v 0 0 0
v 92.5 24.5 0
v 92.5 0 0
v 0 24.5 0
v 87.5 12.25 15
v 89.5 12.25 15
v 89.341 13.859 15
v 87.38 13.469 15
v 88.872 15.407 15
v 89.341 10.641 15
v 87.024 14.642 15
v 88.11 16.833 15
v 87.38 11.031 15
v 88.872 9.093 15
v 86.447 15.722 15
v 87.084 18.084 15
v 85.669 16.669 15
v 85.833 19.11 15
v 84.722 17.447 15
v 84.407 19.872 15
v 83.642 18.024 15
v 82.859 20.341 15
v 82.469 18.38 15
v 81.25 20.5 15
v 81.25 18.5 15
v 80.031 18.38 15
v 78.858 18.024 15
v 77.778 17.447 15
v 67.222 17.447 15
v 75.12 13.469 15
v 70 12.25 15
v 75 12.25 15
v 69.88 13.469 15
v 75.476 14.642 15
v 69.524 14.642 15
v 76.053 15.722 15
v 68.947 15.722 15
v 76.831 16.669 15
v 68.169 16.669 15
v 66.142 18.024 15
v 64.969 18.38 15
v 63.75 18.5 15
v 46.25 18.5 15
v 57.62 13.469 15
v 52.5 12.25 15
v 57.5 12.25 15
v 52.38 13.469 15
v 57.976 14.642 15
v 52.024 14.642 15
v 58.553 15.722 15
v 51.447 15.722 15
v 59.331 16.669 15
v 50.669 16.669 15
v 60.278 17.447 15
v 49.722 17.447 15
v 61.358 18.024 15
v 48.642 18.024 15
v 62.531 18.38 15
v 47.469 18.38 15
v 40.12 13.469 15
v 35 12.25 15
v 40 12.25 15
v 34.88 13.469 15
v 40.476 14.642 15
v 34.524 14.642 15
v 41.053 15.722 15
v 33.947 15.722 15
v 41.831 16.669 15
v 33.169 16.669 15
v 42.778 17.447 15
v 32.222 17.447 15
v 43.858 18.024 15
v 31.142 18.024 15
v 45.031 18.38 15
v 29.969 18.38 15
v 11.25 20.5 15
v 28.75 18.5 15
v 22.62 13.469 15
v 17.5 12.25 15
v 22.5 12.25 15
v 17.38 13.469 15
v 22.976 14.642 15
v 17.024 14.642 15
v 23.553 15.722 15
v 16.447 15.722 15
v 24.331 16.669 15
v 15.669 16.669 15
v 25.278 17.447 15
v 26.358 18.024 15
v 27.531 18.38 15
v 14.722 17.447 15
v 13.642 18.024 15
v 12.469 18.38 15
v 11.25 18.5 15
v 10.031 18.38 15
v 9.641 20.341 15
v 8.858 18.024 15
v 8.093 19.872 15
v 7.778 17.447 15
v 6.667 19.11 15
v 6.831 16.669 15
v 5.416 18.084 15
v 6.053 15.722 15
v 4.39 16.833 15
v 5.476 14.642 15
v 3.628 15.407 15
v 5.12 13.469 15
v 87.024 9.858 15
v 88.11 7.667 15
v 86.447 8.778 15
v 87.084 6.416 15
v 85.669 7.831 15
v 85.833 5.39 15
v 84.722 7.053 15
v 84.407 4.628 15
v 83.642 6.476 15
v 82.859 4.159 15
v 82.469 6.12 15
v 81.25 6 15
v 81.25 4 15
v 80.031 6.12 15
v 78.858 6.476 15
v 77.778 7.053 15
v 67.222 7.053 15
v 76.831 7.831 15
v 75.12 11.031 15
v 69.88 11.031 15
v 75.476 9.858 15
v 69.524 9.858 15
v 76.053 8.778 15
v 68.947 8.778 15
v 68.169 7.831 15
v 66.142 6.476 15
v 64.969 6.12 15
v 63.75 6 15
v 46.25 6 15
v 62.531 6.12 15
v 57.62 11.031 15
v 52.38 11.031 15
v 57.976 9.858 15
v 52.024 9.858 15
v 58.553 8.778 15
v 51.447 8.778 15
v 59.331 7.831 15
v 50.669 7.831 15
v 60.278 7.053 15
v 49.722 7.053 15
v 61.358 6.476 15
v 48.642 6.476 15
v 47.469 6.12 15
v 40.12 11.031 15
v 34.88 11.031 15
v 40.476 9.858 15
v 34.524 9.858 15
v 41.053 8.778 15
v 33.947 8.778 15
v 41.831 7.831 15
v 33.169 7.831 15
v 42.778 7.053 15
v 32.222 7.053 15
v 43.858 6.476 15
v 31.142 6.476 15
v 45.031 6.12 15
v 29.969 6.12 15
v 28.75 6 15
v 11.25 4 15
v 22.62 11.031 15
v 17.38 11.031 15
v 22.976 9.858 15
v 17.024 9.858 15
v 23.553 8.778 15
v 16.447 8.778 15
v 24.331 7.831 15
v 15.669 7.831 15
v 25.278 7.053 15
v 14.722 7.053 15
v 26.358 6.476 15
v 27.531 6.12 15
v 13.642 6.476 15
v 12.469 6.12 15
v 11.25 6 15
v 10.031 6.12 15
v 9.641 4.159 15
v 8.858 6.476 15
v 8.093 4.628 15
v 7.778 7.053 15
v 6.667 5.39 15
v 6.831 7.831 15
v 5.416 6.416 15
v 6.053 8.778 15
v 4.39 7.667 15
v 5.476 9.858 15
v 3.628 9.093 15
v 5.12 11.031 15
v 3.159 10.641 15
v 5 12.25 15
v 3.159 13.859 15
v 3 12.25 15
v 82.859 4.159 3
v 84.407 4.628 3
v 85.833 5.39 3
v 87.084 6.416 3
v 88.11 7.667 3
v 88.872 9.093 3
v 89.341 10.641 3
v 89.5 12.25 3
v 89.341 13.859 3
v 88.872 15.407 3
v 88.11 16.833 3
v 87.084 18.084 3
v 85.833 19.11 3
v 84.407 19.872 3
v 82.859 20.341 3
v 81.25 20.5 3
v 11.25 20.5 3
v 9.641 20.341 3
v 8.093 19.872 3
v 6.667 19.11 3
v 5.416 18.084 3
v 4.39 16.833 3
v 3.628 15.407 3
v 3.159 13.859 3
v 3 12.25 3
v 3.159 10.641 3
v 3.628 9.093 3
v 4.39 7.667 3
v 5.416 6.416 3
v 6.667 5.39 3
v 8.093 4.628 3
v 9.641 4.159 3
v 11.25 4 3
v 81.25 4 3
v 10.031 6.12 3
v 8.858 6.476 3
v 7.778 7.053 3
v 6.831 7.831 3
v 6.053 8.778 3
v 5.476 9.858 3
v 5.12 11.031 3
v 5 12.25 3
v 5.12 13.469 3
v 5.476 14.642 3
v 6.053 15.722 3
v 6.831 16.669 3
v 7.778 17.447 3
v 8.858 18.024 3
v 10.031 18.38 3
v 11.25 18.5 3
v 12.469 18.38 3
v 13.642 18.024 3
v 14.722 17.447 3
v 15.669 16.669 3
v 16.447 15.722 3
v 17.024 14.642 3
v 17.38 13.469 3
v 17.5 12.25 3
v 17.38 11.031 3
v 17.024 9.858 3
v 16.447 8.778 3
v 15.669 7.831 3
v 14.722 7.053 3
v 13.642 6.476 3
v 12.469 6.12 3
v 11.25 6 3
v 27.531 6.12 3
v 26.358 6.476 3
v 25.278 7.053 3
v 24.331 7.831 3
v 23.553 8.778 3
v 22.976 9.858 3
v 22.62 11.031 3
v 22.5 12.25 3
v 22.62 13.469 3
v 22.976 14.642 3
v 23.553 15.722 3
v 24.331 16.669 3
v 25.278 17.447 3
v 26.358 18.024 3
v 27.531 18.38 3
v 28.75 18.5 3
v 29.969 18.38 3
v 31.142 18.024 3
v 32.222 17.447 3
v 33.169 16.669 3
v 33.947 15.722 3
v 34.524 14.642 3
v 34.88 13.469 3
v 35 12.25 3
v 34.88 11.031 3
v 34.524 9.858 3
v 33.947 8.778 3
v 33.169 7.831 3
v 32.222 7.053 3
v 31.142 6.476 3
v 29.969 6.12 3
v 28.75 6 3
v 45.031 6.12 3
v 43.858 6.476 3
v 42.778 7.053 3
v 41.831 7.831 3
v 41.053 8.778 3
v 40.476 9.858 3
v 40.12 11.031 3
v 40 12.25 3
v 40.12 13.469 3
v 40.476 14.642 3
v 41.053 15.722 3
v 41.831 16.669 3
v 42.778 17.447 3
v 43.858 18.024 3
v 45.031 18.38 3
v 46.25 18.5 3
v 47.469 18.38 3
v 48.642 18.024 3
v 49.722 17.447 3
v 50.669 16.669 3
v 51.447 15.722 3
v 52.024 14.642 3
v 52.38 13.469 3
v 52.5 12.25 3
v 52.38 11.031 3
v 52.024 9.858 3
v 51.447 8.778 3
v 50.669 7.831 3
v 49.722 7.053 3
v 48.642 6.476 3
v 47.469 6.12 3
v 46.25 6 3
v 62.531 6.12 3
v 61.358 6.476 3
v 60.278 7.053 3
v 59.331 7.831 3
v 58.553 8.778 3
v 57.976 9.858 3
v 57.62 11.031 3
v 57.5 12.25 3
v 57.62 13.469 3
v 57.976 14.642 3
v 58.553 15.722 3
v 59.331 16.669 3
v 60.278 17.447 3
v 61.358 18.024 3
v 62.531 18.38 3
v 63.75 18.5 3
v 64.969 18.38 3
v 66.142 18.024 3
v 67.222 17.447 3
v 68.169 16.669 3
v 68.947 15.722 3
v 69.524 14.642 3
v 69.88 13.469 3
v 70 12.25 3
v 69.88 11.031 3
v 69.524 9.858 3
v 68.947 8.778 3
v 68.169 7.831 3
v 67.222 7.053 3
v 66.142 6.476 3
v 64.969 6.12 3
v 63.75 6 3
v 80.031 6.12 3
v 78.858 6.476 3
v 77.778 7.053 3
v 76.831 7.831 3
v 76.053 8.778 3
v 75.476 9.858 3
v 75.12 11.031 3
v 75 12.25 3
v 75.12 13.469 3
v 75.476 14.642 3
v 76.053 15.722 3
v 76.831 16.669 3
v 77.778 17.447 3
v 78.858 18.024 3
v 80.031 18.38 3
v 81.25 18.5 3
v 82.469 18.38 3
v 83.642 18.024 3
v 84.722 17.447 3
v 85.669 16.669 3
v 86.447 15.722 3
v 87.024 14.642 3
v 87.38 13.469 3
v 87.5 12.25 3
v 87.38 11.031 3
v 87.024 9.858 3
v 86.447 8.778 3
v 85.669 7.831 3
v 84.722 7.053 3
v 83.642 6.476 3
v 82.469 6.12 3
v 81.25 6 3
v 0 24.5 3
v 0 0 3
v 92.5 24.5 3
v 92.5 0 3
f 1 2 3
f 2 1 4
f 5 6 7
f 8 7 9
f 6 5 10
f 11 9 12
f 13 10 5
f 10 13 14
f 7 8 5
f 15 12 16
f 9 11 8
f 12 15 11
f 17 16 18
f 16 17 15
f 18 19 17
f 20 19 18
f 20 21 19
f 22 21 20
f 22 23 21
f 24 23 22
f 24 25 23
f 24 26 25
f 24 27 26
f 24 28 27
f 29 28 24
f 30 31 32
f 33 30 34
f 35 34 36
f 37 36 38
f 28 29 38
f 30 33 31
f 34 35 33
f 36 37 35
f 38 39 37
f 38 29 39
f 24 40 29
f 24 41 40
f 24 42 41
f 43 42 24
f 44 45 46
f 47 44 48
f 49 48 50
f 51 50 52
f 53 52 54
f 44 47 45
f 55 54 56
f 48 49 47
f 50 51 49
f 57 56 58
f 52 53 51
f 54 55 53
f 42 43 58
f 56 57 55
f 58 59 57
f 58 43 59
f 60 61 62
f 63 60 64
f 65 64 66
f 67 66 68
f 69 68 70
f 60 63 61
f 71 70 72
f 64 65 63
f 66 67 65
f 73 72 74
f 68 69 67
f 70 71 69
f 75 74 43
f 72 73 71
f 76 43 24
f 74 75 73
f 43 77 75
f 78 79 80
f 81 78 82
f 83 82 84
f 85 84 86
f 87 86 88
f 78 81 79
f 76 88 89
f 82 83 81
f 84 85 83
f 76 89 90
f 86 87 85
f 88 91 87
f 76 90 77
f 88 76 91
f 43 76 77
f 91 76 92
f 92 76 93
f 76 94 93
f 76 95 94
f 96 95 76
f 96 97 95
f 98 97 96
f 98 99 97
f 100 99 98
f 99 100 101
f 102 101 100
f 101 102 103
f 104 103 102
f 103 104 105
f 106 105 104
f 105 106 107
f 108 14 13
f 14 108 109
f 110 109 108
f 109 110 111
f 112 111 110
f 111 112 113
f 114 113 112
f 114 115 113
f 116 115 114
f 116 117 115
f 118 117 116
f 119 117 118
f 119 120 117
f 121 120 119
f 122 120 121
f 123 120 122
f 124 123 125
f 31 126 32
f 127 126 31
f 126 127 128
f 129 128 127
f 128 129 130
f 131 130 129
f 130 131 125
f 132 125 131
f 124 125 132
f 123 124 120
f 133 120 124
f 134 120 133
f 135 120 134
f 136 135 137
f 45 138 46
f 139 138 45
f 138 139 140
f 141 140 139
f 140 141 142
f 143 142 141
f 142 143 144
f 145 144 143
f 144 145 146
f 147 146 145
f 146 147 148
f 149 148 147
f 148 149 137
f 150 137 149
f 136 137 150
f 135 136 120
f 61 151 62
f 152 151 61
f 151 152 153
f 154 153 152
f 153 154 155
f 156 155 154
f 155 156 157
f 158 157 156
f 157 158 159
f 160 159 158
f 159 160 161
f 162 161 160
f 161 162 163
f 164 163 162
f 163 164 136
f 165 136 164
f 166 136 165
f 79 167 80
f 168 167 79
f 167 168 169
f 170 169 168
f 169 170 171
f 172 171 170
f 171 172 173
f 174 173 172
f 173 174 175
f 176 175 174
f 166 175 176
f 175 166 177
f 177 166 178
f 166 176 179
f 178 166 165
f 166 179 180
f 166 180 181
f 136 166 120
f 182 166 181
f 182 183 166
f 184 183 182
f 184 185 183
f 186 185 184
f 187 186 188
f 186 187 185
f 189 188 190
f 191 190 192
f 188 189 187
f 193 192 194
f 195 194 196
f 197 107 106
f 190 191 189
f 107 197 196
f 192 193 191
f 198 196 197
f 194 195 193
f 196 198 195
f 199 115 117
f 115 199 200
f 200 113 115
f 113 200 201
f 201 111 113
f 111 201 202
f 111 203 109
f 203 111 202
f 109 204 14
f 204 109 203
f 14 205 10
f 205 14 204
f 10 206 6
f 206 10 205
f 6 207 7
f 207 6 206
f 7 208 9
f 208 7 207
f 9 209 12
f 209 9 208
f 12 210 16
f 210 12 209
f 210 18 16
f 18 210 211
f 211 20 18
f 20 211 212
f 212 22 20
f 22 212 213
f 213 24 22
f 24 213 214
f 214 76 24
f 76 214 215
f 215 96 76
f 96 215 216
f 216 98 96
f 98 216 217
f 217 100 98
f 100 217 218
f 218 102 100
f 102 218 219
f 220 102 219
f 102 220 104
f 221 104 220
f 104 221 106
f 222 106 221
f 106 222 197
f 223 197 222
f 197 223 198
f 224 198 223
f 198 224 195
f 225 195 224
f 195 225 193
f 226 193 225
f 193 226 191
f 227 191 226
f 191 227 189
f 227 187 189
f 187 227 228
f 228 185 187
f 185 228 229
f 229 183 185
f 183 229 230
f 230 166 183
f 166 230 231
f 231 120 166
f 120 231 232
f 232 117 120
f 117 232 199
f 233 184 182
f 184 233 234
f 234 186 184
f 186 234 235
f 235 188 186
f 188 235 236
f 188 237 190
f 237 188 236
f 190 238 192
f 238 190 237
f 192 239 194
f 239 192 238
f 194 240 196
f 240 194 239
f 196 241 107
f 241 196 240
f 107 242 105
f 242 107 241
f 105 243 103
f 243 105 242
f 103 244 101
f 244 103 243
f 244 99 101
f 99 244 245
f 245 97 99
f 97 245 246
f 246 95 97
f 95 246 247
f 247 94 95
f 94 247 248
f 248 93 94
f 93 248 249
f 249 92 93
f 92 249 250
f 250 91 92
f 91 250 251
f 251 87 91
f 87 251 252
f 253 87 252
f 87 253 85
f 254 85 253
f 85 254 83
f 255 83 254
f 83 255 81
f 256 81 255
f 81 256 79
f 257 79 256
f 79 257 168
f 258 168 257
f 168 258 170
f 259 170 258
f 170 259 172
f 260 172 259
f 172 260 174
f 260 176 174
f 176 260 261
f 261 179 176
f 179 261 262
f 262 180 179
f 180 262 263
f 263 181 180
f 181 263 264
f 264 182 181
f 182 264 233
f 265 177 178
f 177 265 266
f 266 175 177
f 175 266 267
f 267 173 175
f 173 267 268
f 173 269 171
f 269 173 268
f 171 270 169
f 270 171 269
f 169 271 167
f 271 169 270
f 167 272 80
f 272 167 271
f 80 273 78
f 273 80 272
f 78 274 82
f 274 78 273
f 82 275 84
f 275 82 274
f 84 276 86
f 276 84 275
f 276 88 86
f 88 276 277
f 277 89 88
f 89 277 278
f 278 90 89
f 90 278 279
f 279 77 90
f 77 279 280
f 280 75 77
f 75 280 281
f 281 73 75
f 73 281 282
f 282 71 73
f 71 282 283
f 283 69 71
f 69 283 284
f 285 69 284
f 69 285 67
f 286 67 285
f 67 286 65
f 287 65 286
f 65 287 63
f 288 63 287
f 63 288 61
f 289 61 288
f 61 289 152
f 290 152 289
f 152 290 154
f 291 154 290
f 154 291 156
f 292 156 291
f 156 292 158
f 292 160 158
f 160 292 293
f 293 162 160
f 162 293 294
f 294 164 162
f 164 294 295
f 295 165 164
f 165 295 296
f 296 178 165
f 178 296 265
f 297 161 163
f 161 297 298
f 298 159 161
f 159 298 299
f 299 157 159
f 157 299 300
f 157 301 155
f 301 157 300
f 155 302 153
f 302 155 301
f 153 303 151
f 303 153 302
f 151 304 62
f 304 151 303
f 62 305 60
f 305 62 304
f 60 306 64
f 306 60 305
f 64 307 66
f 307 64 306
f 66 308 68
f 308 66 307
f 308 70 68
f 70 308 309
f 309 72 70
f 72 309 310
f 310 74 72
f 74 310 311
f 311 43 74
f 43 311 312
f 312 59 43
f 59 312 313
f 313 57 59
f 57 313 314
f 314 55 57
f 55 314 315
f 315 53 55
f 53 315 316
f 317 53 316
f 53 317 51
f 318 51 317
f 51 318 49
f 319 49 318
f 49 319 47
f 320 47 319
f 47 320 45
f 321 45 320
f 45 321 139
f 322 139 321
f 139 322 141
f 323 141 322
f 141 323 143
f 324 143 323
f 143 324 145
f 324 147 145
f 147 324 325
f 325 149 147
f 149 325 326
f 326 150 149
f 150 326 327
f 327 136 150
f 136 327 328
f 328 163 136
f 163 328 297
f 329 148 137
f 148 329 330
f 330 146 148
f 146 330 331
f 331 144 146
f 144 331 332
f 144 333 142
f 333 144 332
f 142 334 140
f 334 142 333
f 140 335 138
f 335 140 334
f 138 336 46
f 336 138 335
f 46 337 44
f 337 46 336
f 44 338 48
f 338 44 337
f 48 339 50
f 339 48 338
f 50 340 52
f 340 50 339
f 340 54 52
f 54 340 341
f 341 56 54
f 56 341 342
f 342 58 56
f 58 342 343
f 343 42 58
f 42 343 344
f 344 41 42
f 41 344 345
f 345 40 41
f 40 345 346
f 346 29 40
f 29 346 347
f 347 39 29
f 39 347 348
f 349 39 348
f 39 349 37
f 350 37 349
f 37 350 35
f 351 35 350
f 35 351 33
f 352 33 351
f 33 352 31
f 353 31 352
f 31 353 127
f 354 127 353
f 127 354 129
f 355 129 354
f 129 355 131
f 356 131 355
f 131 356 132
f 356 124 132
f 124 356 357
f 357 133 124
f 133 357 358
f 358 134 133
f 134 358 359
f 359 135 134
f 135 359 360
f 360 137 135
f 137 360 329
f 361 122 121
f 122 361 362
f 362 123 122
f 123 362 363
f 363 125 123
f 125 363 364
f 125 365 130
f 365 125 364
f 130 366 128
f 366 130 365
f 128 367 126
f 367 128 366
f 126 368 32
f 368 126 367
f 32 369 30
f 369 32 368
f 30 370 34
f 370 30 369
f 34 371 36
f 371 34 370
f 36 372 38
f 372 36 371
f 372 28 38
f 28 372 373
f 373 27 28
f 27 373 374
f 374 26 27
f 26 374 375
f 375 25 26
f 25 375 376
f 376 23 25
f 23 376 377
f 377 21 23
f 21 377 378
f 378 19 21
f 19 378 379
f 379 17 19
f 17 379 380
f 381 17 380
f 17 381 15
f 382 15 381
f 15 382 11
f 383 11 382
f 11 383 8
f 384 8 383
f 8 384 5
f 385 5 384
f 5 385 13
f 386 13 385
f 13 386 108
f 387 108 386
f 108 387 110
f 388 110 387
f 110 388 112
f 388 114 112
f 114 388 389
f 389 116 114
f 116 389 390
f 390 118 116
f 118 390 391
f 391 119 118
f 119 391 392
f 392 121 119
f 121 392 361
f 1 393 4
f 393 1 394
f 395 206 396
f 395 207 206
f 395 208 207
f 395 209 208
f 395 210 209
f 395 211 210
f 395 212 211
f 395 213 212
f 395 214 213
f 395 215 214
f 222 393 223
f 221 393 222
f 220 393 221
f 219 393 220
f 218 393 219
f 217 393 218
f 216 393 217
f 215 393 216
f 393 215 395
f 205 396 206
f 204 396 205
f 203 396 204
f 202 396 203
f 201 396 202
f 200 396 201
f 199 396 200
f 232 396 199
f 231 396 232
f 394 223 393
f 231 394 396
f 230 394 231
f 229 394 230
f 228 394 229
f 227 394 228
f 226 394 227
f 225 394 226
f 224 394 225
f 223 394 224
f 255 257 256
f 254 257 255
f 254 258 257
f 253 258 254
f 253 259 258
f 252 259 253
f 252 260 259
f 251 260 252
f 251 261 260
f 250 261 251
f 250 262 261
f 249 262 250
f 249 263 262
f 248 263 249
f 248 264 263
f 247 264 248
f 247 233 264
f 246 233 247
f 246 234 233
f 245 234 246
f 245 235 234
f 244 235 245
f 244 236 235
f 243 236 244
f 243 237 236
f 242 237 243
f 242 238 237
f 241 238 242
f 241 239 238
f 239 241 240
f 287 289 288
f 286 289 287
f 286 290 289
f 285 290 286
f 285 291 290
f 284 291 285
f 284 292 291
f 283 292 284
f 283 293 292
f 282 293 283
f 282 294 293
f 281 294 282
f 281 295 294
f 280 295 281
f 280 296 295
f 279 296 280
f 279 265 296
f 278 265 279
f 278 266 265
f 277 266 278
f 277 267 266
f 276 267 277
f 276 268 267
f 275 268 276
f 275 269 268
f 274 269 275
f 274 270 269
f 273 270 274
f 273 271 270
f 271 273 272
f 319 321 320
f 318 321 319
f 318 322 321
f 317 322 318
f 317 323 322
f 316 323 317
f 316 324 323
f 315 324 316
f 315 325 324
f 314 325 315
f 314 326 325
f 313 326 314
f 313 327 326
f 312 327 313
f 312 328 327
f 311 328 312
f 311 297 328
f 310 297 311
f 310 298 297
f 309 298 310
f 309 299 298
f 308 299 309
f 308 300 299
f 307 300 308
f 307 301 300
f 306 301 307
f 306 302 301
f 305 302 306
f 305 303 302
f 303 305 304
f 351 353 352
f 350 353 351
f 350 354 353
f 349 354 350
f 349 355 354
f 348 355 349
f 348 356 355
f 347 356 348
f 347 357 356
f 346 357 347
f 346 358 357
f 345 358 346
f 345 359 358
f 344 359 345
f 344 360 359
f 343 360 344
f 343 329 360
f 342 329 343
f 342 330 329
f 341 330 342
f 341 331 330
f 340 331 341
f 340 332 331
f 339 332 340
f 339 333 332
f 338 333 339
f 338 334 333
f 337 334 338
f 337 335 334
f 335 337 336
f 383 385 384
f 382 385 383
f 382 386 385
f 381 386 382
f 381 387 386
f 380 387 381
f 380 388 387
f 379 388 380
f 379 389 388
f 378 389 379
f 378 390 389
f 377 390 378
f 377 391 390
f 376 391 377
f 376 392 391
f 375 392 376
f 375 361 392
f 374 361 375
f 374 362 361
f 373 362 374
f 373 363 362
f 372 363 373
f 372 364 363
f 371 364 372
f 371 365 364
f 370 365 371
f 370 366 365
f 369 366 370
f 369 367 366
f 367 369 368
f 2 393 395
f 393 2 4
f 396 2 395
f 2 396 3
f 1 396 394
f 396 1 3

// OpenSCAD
thickness=2;
tubeDia=12.5;
tubeRad=tubeDia/2;
space=5;
plateWidth=tubeDia+thickness+space*2;
tubeNum=5;
plateLength=tubeNum*tubeDia+(tubeNum+1)*space;

fn=32;
holderHeight=15;
plateHeight=3;

linear_extrude(holderHeight){
    difference(){
  
        hull(){
            for(i=[0:tubeNum-1]){
            translate([i*(space+tubeDia)+(space+tubeRad),plateWidth/2])
            circle(tubeRad+thickness,$fn=fn);
            }
        }
        
        
        for(i=[0:tubeNum-1]){
        translate([i*(space+tubeDia)+(space+tubeRad),plateWidth/2])
        circle(tubeRad,$fn=fn);
        }
    }
}
linear_extrude(plateHeight){
    square([plateLength,plateWidth]);
    }
